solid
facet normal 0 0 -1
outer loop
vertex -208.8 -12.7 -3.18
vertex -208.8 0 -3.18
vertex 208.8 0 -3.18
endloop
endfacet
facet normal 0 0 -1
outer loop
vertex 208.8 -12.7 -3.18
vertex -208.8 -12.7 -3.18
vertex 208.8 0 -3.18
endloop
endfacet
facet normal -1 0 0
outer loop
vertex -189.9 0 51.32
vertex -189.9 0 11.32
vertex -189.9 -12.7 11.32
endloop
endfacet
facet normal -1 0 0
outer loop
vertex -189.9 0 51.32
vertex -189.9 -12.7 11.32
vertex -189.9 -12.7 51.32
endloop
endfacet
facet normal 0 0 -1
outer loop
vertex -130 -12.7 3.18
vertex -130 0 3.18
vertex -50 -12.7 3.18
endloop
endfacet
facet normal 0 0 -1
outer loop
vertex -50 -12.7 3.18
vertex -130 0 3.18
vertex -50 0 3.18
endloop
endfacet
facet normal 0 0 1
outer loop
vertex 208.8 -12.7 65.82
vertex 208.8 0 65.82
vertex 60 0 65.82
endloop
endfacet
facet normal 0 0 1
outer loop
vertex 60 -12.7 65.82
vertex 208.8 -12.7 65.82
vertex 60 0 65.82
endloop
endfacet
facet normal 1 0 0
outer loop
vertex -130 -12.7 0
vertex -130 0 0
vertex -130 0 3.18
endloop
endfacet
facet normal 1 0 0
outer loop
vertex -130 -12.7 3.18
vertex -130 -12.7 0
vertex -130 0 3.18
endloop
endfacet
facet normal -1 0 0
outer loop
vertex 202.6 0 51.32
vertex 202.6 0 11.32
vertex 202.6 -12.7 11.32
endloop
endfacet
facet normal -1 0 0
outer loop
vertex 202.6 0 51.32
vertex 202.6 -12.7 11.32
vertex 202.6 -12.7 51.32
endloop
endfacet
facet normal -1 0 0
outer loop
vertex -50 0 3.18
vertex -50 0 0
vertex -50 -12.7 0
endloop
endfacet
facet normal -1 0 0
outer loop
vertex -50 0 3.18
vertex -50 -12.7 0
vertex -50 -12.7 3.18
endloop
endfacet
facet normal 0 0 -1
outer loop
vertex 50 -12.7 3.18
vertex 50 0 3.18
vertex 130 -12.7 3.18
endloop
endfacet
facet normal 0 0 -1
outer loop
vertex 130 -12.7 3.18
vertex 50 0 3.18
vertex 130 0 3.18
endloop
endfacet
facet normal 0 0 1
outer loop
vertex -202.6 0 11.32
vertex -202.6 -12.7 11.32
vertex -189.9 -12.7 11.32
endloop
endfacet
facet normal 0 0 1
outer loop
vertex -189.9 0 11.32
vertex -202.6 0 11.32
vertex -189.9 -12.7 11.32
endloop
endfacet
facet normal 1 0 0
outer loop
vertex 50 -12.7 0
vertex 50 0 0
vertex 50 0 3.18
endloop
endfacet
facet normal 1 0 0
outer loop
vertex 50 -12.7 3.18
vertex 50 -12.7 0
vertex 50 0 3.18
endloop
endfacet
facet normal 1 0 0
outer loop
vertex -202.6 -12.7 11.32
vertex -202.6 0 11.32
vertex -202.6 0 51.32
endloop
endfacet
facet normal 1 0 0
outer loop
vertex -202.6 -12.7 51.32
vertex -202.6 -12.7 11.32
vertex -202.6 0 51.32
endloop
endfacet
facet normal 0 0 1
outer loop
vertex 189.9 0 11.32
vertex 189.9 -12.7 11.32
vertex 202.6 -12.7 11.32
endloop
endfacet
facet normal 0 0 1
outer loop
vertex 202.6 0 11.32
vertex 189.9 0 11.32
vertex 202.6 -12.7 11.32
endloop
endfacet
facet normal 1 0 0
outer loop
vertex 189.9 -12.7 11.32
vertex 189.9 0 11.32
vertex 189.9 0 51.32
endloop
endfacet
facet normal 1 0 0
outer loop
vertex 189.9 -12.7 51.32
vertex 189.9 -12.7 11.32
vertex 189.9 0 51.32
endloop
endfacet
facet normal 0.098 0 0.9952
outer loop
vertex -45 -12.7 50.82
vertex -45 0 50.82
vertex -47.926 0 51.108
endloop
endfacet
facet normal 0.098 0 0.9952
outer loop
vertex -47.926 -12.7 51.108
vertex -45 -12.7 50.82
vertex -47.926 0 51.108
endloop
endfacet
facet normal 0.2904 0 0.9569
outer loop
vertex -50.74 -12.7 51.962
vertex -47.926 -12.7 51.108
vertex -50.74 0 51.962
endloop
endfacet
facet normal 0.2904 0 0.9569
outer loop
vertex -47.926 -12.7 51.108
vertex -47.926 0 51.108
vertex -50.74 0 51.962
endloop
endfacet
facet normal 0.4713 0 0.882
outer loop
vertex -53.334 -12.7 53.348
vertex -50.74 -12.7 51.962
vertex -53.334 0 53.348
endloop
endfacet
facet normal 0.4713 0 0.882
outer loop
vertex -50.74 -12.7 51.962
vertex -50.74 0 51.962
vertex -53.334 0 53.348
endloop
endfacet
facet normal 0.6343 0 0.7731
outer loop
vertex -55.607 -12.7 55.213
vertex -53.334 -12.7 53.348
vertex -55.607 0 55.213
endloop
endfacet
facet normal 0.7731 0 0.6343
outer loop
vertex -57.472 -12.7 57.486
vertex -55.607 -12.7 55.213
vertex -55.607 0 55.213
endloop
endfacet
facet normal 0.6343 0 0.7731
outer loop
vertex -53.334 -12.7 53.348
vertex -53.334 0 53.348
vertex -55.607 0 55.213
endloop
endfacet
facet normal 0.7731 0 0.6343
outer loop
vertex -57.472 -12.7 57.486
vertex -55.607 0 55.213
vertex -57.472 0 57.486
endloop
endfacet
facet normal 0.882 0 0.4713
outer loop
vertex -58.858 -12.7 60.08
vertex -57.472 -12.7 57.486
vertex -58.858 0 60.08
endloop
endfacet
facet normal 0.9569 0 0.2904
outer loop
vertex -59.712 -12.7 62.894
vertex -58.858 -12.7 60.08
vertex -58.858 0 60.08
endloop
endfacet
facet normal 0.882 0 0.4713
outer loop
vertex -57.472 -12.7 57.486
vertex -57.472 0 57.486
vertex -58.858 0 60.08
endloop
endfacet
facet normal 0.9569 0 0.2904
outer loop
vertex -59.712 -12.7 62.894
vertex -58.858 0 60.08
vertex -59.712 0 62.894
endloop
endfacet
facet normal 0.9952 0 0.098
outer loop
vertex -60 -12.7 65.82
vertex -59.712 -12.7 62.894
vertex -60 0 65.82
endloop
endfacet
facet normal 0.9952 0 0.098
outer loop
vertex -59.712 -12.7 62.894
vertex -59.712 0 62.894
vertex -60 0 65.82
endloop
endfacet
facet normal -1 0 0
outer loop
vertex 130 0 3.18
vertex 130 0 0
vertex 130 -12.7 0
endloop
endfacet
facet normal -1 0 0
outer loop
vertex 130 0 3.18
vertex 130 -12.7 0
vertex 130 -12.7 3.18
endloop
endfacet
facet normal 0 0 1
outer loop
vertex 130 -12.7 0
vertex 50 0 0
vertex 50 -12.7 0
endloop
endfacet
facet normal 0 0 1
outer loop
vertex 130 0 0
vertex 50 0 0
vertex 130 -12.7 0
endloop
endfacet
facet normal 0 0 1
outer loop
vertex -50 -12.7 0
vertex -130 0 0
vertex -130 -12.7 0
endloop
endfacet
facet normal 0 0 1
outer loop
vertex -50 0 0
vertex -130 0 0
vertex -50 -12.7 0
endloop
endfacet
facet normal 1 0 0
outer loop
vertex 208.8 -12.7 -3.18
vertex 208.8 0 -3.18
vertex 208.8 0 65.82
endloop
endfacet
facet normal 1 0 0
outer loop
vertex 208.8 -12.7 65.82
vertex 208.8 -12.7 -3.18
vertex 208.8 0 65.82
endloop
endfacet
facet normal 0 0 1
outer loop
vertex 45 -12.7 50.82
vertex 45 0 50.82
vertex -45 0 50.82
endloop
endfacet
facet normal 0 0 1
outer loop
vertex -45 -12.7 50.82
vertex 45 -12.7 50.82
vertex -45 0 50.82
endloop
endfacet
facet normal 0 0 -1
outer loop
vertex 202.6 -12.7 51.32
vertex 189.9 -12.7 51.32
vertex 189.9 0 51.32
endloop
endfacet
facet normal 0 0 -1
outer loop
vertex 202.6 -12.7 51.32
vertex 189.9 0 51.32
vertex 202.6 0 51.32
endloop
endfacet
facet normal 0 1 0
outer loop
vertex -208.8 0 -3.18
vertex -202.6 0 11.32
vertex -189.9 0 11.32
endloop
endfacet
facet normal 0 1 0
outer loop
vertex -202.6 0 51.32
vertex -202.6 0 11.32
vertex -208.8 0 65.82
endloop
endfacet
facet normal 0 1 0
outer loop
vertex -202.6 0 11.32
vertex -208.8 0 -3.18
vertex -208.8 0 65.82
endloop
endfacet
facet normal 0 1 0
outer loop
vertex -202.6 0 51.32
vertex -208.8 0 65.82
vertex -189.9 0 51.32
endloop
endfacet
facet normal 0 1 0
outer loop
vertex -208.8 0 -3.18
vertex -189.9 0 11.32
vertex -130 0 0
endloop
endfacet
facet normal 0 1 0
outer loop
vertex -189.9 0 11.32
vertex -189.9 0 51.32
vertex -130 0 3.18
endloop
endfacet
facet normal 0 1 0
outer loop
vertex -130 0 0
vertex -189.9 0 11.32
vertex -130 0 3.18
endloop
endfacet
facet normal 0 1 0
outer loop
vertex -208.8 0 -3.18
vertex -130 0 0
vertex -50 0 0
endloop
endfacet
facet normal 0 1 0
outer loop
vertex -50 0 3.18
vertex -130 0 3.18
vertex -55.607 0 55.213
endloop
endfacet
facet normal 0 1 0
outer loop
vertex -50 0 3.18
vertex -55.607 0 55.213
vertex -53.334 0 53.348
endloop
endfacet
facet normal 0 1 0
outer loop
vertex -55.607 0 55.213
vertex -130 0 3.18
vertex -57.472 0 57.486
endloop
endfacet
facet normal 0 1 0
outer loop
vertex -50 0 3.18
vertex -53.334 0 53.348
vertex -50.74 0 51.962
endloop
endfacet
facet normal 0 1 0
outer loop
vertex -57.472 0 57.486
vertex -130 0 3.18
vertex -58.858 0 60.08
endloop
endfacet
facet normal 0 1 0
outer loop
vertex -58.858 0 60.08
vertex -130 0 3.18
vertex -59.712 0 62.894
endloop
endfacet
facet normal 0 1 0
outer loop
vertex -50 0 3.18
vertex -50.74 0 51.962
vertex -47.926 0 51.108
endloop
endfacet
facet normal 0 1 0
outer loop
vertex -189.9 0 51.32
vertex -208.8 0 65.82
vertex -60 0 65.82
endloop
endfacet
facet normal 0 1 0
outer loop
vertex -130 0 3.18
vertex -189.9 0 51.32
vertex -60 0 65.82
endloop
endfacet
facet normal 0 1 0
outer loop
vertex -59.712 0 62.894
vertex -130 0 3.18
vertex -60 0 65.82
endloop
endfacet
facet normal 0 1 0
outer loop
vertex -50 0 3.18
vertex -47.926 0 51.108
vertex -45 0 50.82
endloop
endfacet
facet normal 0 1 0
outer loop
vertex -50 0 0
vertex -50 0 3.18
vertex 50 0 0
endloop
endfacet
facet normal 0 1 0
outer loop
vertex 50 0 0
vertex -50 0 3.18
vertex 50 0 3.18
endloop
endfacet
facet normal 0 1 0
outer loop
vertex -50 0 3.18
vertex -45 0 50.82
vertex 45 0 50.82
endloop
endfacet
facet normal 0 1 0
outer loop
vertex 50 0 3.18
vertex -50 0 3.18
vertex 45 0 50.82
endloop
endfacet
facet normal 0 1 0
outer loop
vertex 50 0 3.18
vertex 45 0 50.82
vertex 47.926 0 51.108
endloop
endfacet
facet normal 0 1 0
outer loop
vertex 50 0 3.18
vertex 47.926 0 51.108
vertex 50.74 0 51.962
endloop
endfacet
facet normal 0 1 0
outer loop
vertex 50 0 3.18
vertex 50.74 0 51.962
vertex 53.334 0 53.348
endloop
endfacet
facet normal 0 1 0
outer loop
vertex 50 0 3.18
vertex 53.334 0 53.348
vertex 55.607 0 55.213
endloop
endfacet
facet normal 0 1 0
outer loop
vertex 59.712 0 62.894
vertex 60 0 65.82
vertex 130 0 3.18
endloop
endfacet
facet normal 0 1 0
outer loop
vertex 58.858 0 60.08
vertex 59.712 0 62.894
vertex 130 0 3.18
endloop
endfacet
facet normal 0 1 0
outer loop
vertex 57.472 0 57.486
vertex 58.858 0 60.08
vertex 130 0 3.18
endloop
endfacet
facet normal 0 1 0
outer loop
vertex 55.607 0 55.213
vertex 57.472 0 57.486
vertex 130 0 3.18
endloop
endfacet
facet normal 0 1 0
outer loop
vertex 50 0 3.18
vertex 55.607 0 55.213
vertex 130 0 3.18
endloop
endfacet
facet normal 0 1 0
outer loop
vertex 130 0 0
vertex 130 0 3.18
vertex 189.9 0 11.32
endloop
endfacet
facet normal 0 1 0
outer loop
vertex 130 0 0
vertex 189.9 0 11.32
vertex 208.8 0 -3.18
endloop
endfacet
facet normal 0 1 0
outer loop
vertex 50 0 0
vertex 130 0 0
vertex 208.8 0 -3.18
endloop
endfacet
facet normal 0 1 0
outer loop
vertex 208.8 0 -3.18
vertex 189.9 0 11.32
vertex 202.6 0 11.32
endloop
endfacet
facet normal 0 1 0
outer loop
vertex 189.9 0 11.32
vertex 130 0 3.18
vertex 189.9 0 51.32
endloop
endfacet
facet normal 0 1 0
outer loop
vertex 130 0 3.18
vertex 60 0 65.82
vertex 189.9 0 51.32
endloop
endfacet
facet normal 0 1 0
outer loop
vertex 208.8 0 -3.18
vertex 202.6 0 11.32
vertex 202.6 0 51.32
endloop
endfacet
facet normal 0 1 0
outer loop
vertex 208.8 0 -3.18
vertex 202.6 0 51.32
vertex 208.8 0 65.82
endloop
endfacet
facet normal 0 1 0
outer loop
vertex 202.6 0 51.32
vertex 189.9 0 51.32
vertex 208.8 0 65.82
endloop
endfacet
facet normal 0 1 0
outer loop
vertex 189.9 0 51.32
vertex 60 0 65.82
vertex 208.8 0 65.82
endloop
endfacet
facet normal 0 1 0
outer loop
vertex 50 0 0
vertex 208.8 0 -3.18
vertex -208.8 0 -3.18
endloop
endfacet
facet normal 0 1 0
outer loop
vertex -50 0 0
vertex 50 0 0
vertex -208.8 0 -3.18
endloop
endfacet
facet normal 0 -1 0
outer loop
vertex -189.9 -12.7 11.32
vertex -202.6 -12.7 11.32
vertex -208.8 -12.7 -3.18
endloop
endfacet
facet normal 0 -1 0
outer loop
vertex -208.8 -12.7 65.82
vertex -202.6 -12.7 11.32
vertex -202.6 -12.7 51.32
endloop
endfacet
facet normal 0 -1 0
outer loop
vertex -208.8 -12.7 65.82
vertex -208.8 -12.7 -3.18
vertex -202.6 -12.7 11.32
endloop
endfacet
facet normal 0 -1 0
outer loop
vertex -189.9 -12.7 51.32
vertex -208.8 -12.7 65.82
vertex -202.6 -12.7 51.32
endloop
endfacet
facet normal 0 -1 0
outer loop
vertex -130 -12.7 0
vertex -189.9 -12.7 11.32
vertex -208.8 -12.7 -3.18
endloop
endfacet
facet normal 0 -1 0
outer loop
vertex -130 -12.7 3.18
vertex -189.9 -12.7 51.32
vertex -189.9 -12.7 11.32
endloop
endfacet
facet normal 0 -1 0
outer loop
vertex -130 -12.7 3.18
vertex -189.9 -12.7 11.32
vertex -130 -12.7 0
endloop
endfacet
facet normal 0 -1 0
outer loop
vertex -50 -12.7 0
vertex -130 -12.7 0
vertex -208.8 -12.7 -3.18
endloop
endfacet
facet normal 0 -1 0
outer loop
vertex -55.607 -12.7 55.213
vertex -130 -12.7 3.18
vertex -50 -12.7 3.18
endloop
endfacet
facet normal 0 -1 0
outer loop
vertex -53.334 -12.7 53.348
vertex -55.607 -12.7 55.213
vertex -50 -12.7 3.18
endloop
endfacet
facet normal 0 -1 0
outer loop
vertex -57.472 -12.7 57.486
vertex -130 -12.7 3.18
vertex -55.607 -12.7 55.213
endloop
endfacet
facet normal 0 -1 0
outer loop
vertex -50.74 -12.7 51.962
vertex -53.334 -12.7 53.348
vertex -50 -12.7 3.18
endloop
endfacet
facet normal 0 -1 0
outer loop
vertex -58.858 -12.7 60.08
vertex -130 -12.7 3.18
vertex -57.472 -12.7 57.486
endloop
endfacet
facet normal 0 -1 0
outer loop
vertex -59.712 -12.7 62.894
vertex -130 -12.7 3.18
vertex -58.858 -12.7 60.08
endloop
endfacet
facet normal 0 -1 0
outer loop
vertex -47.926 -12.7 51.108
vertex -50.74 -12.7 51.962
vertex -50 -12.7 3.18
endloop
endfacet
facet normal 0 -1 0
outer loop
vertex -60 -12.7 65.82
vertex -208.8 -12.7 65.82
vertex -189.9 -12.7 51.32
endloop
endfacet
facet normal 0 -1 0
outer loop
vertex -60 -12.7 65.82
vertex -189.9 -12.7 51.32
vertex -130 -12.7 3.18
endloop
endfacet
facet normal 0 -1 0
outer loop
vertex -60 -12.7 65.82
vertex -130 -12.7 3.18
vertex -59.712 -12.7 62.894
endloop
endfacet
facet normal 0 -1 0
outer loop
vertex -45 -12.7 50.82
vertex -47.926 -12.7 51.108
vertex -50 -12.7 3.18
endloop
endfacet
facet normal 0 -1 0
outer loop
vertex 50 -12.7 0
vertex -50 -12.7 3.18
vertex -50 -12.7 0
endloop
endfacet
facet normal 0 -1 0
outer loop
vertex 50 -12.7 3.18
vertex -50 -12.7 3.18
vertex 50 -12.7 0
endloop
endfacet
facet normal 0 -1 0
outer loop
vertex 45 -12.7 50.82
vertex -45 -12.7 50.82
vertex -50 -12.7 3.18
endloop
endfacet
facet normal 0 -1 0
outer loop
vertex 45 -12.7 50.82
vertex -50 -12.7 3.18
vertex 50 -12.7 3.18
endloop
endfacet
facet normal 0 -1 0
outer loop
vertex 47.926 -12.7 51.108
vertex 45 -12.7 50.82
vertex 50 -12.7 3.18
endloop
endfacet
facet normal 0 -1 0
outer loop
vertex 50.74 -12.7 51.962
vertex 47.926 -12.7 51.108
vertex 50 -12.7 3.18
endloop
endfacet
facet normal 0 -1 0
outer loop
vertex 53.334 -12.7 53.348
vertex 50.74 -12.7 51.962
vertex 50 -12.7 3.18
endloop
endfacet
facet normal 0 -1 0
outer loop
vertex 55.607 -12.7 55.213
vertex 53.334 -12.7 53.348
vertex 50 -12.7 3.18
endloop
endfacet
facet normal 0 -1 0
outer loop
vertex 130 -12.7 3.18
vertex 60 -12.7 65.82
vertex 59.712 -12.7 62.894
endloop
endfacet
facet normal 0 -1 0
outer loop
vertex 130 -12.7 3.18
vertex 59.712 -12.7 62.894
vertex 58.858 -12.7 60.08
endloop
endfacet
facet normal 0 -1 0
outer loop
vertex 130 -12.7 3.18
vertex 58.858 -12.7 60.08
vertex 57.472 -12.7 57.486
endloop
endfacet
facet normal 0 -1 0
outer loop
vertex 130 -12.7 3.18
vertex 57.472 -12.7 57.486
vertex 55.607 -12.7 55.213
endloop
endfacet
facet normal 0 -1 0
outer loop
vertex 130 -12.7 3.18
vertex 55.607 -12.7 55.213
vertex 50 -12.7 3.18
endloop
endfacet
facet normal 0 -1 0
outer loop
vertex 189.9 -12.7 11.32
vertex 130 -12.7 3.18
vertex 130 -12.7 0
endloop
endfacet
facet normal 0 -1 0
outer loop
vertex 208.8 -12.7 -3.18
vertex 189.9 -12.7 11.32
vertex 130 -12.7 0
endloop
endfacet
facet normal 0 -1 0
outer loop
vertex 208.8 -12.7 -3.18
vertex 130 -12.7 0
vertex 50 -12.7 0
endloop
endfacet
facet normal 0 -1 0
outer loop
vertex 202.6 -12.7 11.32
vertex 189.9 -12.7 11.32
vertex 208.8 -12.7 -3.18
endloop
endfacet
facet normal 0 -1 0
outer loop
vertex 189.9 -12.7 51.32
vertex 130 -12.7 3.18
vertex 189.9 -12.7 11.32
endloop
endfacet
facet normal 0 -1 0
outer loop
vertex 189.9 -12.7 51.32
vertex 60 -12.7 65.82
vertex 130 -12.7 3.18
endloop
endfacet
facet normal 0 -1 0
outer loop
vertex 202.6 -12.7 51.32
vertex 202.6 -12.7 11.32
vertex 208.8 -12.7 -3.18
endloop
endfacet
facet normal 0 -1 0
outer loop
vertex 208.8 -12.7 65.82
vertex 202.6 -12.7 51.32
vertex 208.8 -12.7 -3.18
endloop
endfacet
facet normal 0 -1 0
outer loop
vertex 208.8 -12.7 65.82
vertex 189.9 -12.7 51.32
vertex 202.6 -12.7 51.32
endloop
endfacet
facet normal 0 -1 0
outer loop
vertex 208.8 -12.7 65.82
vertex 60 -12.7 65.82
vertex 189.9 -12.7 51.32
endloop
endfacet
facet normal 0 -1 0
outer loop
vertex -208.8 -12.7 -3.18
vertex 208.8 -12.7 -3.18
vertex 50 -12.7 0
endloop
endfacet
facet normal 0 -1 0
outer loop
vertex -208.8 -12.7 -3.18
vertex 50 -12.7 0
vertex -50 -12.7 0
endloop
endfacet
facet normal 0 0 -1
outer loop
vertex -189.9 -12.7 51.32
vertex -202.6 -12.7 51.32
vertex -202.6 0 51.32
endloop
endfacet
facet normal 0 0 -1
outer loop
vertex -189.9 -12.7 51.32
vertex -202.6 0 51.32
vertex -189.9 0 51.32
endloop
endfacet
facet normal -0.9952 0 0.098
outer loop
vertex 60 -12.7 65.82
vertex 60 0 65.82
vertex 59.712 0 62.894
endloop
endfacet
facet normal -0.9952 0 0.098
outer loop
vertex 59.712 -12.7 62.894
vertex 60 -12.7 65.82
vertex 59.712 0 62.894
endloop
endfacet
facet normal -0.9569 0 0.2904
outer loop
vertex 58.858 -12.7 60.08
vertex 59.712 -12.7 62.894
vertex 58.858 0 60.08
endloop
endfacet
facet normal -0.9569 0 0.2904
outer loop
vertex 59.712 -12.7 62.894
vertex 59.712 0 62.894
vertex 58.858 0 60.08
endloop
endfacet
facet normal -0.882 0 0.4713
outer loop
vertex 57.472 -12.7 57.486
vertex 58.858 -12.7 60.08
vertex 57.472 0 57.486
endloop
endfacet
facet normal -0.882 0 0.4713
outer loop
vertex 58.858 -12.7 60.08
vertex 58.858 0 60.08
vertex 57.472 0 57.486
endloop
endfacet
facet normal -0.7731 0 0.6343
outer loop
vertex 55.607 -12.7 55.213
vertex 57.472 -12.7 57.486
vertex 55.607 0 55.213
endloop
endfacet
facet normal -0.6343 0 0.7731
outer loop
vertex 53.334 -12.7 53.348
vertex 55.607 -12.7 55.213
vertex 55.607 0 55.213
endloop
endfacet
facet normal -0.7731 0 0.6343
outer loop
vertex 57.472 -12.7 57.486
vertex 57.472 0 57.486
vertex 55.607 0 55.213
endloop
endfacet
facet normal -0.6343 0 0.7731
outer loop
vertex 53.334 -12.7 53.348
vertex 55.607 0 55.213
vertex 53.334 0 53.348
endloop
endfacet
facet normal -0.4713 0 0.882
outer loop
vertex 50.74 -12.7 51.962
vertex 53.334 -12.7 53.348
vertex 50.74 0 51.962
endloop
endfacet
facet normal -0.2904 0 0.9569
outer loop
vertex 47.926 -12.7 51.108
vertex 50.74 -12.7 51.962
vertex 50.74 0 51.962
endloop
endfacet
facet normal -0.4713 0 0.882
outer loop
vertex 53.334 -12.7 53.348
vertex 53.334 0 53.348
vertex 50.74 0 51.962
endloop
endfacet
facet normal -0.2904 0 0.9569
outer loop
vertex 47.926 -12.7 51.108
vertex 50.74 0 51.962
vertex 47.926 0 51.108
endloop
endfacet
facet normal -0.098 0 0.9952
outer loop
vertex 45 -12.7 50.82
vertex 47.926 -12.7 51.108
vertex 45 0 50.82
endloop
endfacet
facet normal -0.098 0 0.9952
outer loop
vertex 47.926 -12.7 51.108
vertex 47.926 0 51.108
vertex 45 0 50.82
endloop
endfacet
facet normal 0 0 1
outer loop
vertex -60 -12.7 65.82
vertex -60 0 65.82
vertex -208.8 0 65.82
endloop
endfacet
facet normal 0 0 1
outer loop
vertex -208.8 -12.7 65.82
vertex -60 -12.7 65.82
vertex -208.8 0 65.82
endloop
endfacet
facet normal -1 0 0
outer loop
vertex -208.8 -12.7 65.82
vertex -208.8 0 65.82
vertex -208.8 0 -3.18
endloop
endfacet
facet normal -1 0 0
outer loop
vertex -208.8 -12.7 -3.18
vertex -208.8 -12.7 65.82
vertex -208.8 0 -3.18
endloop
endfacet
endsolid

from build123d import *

# Parameters (mm, degrees)
F1_W     = 80
F1_H     = 3.18
F1_W_2   = 12.7
F1_H_2   = 40
F2_DEPTH = 12.7


with BuildPart() as f2:
    # F1 (on Front) → F2 (new body)
    with BuildSketch(Plane.XZ):
        with BuildLine():
            Line((-208.8, 65.82), (-208.8, -3.18))
            Line((-208.8, -3.18), (208.8, -3.18))
            Line((208.8, -3.18), (208.8, 65.82))
            Line((208.8, 65.82), (60, 65.82))
            ThreePointArc((60, 65.82), (55.6066017178, 55.2133982822), (45, 50.82))
            Line((45, 50.82), (-45, 50.82))
            ThreePointArc((-45, 50.82), (-55.6066017178, 55.2133982822), (-60, 65.82))
            Line((-60, 65.82), (-208.8, 65.82))
        make_face()
        with Locations((-90, 1.59)):
            Rectangle(F1_W, F1_H, mode=Mode.SUBTRACT)
        with Locations((90, 1.59)):
            Rectangle(F1_W, F1_H, mode=Mode.SUBTRACT)
        with Locations((-196.25, 31.32)):
            Rectangle(F1_W_2, F1_H_2, mode=Mode.SUBTRACT)
        with Locations((196.25, 31.32)):
            Rectangle(F1_W_2, F1_H_2, mode=Mode.SUBTRACT)
    extrude(amount=F2_DEPTH)


solid = f2.part
